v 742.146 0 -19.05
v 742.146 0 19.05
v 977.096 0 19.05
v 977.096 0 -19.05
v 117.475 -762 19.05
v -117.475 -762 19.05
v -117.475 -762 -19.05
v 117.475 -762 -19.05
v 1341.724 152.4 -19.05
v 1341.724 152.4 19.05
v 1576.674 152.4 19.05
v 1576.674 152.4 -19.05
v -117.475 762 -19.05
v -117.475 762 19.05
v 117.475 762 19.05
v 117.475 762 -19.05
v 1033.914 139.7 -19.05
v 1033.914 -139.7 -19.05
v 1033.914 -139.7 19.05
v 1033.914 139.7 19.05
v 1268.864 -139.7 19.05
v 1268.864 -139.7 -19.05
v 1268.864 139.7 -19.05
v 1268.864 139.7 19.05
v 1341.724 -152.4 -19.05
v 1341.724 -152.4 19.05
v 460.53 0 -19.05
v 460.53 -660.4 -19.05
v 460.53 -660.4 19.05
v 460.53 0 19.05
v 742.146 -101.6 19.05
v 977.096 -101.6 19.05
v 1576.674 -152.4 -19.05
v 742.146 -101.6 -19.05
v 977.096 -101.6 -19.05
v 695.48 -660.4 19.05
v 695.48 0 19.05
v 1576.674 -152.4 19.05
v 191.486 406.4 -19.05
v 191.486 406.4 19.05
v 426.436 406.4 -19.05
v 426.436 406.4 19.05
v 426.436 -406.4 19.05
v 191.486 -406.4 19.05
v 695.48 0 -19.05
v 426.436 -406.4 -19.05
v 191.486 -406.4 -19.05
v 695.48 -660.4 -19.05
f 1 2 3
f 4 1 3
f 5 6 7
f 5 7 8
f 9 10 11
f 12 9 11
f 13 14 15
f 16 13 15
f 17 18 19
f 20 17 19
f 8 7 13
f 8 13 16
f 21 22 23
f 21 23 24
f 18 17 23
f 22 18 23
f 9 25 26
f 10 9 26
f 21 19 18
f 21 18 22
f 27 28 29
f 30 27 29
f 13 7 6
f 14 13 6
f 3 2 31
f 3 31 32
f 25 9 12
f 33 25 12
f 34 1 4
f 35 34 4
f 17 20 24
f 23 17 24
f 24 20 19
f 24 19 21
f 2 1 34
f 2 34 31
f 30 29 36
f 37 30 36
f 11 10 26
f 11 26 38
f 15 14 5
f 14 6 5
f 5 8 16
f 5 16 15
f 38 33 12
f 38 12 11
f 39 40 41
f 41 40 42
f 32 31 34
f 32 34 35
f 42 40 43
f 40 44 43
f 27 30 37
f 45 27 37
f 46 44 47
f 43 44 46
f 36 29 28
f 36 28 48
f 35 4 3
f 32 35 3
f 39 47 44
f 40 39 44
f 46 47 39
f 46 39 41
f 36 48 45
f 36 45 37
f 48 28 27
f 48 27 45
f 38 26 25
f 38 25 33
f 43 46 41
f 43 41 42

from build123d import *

# Parameters (mm, degrees)
F0_W      = 234.95
F0_H      = 38.1
F1_DEPTH  = 762
F2_W      = 234.95
F2_H      = 38.1
F3_DEPTH  = 406.4
F4_W      = 234.95
F4_H      = 38.1
F5_DEPTH  = 660.4
F6_W      = 234.95
F6_H      = 38.1
F7_DEPTH  = 101.6
F8_W      = 234.95
F8_H      = 38.1
F9_DEPTH  = 139.7
F10_W     = 234.95
F10_H     = 38.1
F11_DEPTH = 152.4


with BuildPart() as f1:
    # F0 (on Front) → F1 (new body, symmetric)
    with BuildSketch(Plane.XZ):
        Rectangle(F0_W, F0_H)
    extrude(amount=F1_DEPTH, both=True)


with BuildPart() as f3:
    # F2 (on Front) → F3 (new body, symmetric)
    with BuildSketch(Plane.XZ):
        with Locations((308.961176, 0)):
            Rectangle(F2_W, F2_H)
    extrude(amount=F3_DEPTH, both=True)


with BuildPart() as f5:
    # F4 (on Front) → F5 (new body)
    with BuildSketch(Plane.XZ):
        with Locations((578.005398, 0)):
            Rectangle(F4_W, F4_H)
    extrude(amount=F5_DEPTH)


with BuildPart() as f7:
    # F6 (on Front) → F7 (new body)
    with BuildSketch(Plane.XZ):
        with Locations((859.621048, 0)):
            Rectangle(F6_W, F6_H)
    extrude(amount=F7_DEPTH)


with BuildPart() as f9:
    # F8 (on Front) → F9 (new body, symmetric)
    with BuildSketch(Plane.XZ):
        with Locations((1151.38877, 0)):
            Rectangle(F8_W, F8_H)
    extrude(amount=F9_DEPTH, both=True)


with BuildPart() as f11:
    # F10 (on Front) → F11 (new body, symmetric)
    with BuildSketch(Plane.XZ):
        with Locations((1459.19919, 0)):
            Rectangle(F10_W, F10_H)
    extrude(amount=F11_DEPTH, both=True)


solid = Compound([f1.part, f3.part, f5.part, f7.part, f9.part, f11.part])
